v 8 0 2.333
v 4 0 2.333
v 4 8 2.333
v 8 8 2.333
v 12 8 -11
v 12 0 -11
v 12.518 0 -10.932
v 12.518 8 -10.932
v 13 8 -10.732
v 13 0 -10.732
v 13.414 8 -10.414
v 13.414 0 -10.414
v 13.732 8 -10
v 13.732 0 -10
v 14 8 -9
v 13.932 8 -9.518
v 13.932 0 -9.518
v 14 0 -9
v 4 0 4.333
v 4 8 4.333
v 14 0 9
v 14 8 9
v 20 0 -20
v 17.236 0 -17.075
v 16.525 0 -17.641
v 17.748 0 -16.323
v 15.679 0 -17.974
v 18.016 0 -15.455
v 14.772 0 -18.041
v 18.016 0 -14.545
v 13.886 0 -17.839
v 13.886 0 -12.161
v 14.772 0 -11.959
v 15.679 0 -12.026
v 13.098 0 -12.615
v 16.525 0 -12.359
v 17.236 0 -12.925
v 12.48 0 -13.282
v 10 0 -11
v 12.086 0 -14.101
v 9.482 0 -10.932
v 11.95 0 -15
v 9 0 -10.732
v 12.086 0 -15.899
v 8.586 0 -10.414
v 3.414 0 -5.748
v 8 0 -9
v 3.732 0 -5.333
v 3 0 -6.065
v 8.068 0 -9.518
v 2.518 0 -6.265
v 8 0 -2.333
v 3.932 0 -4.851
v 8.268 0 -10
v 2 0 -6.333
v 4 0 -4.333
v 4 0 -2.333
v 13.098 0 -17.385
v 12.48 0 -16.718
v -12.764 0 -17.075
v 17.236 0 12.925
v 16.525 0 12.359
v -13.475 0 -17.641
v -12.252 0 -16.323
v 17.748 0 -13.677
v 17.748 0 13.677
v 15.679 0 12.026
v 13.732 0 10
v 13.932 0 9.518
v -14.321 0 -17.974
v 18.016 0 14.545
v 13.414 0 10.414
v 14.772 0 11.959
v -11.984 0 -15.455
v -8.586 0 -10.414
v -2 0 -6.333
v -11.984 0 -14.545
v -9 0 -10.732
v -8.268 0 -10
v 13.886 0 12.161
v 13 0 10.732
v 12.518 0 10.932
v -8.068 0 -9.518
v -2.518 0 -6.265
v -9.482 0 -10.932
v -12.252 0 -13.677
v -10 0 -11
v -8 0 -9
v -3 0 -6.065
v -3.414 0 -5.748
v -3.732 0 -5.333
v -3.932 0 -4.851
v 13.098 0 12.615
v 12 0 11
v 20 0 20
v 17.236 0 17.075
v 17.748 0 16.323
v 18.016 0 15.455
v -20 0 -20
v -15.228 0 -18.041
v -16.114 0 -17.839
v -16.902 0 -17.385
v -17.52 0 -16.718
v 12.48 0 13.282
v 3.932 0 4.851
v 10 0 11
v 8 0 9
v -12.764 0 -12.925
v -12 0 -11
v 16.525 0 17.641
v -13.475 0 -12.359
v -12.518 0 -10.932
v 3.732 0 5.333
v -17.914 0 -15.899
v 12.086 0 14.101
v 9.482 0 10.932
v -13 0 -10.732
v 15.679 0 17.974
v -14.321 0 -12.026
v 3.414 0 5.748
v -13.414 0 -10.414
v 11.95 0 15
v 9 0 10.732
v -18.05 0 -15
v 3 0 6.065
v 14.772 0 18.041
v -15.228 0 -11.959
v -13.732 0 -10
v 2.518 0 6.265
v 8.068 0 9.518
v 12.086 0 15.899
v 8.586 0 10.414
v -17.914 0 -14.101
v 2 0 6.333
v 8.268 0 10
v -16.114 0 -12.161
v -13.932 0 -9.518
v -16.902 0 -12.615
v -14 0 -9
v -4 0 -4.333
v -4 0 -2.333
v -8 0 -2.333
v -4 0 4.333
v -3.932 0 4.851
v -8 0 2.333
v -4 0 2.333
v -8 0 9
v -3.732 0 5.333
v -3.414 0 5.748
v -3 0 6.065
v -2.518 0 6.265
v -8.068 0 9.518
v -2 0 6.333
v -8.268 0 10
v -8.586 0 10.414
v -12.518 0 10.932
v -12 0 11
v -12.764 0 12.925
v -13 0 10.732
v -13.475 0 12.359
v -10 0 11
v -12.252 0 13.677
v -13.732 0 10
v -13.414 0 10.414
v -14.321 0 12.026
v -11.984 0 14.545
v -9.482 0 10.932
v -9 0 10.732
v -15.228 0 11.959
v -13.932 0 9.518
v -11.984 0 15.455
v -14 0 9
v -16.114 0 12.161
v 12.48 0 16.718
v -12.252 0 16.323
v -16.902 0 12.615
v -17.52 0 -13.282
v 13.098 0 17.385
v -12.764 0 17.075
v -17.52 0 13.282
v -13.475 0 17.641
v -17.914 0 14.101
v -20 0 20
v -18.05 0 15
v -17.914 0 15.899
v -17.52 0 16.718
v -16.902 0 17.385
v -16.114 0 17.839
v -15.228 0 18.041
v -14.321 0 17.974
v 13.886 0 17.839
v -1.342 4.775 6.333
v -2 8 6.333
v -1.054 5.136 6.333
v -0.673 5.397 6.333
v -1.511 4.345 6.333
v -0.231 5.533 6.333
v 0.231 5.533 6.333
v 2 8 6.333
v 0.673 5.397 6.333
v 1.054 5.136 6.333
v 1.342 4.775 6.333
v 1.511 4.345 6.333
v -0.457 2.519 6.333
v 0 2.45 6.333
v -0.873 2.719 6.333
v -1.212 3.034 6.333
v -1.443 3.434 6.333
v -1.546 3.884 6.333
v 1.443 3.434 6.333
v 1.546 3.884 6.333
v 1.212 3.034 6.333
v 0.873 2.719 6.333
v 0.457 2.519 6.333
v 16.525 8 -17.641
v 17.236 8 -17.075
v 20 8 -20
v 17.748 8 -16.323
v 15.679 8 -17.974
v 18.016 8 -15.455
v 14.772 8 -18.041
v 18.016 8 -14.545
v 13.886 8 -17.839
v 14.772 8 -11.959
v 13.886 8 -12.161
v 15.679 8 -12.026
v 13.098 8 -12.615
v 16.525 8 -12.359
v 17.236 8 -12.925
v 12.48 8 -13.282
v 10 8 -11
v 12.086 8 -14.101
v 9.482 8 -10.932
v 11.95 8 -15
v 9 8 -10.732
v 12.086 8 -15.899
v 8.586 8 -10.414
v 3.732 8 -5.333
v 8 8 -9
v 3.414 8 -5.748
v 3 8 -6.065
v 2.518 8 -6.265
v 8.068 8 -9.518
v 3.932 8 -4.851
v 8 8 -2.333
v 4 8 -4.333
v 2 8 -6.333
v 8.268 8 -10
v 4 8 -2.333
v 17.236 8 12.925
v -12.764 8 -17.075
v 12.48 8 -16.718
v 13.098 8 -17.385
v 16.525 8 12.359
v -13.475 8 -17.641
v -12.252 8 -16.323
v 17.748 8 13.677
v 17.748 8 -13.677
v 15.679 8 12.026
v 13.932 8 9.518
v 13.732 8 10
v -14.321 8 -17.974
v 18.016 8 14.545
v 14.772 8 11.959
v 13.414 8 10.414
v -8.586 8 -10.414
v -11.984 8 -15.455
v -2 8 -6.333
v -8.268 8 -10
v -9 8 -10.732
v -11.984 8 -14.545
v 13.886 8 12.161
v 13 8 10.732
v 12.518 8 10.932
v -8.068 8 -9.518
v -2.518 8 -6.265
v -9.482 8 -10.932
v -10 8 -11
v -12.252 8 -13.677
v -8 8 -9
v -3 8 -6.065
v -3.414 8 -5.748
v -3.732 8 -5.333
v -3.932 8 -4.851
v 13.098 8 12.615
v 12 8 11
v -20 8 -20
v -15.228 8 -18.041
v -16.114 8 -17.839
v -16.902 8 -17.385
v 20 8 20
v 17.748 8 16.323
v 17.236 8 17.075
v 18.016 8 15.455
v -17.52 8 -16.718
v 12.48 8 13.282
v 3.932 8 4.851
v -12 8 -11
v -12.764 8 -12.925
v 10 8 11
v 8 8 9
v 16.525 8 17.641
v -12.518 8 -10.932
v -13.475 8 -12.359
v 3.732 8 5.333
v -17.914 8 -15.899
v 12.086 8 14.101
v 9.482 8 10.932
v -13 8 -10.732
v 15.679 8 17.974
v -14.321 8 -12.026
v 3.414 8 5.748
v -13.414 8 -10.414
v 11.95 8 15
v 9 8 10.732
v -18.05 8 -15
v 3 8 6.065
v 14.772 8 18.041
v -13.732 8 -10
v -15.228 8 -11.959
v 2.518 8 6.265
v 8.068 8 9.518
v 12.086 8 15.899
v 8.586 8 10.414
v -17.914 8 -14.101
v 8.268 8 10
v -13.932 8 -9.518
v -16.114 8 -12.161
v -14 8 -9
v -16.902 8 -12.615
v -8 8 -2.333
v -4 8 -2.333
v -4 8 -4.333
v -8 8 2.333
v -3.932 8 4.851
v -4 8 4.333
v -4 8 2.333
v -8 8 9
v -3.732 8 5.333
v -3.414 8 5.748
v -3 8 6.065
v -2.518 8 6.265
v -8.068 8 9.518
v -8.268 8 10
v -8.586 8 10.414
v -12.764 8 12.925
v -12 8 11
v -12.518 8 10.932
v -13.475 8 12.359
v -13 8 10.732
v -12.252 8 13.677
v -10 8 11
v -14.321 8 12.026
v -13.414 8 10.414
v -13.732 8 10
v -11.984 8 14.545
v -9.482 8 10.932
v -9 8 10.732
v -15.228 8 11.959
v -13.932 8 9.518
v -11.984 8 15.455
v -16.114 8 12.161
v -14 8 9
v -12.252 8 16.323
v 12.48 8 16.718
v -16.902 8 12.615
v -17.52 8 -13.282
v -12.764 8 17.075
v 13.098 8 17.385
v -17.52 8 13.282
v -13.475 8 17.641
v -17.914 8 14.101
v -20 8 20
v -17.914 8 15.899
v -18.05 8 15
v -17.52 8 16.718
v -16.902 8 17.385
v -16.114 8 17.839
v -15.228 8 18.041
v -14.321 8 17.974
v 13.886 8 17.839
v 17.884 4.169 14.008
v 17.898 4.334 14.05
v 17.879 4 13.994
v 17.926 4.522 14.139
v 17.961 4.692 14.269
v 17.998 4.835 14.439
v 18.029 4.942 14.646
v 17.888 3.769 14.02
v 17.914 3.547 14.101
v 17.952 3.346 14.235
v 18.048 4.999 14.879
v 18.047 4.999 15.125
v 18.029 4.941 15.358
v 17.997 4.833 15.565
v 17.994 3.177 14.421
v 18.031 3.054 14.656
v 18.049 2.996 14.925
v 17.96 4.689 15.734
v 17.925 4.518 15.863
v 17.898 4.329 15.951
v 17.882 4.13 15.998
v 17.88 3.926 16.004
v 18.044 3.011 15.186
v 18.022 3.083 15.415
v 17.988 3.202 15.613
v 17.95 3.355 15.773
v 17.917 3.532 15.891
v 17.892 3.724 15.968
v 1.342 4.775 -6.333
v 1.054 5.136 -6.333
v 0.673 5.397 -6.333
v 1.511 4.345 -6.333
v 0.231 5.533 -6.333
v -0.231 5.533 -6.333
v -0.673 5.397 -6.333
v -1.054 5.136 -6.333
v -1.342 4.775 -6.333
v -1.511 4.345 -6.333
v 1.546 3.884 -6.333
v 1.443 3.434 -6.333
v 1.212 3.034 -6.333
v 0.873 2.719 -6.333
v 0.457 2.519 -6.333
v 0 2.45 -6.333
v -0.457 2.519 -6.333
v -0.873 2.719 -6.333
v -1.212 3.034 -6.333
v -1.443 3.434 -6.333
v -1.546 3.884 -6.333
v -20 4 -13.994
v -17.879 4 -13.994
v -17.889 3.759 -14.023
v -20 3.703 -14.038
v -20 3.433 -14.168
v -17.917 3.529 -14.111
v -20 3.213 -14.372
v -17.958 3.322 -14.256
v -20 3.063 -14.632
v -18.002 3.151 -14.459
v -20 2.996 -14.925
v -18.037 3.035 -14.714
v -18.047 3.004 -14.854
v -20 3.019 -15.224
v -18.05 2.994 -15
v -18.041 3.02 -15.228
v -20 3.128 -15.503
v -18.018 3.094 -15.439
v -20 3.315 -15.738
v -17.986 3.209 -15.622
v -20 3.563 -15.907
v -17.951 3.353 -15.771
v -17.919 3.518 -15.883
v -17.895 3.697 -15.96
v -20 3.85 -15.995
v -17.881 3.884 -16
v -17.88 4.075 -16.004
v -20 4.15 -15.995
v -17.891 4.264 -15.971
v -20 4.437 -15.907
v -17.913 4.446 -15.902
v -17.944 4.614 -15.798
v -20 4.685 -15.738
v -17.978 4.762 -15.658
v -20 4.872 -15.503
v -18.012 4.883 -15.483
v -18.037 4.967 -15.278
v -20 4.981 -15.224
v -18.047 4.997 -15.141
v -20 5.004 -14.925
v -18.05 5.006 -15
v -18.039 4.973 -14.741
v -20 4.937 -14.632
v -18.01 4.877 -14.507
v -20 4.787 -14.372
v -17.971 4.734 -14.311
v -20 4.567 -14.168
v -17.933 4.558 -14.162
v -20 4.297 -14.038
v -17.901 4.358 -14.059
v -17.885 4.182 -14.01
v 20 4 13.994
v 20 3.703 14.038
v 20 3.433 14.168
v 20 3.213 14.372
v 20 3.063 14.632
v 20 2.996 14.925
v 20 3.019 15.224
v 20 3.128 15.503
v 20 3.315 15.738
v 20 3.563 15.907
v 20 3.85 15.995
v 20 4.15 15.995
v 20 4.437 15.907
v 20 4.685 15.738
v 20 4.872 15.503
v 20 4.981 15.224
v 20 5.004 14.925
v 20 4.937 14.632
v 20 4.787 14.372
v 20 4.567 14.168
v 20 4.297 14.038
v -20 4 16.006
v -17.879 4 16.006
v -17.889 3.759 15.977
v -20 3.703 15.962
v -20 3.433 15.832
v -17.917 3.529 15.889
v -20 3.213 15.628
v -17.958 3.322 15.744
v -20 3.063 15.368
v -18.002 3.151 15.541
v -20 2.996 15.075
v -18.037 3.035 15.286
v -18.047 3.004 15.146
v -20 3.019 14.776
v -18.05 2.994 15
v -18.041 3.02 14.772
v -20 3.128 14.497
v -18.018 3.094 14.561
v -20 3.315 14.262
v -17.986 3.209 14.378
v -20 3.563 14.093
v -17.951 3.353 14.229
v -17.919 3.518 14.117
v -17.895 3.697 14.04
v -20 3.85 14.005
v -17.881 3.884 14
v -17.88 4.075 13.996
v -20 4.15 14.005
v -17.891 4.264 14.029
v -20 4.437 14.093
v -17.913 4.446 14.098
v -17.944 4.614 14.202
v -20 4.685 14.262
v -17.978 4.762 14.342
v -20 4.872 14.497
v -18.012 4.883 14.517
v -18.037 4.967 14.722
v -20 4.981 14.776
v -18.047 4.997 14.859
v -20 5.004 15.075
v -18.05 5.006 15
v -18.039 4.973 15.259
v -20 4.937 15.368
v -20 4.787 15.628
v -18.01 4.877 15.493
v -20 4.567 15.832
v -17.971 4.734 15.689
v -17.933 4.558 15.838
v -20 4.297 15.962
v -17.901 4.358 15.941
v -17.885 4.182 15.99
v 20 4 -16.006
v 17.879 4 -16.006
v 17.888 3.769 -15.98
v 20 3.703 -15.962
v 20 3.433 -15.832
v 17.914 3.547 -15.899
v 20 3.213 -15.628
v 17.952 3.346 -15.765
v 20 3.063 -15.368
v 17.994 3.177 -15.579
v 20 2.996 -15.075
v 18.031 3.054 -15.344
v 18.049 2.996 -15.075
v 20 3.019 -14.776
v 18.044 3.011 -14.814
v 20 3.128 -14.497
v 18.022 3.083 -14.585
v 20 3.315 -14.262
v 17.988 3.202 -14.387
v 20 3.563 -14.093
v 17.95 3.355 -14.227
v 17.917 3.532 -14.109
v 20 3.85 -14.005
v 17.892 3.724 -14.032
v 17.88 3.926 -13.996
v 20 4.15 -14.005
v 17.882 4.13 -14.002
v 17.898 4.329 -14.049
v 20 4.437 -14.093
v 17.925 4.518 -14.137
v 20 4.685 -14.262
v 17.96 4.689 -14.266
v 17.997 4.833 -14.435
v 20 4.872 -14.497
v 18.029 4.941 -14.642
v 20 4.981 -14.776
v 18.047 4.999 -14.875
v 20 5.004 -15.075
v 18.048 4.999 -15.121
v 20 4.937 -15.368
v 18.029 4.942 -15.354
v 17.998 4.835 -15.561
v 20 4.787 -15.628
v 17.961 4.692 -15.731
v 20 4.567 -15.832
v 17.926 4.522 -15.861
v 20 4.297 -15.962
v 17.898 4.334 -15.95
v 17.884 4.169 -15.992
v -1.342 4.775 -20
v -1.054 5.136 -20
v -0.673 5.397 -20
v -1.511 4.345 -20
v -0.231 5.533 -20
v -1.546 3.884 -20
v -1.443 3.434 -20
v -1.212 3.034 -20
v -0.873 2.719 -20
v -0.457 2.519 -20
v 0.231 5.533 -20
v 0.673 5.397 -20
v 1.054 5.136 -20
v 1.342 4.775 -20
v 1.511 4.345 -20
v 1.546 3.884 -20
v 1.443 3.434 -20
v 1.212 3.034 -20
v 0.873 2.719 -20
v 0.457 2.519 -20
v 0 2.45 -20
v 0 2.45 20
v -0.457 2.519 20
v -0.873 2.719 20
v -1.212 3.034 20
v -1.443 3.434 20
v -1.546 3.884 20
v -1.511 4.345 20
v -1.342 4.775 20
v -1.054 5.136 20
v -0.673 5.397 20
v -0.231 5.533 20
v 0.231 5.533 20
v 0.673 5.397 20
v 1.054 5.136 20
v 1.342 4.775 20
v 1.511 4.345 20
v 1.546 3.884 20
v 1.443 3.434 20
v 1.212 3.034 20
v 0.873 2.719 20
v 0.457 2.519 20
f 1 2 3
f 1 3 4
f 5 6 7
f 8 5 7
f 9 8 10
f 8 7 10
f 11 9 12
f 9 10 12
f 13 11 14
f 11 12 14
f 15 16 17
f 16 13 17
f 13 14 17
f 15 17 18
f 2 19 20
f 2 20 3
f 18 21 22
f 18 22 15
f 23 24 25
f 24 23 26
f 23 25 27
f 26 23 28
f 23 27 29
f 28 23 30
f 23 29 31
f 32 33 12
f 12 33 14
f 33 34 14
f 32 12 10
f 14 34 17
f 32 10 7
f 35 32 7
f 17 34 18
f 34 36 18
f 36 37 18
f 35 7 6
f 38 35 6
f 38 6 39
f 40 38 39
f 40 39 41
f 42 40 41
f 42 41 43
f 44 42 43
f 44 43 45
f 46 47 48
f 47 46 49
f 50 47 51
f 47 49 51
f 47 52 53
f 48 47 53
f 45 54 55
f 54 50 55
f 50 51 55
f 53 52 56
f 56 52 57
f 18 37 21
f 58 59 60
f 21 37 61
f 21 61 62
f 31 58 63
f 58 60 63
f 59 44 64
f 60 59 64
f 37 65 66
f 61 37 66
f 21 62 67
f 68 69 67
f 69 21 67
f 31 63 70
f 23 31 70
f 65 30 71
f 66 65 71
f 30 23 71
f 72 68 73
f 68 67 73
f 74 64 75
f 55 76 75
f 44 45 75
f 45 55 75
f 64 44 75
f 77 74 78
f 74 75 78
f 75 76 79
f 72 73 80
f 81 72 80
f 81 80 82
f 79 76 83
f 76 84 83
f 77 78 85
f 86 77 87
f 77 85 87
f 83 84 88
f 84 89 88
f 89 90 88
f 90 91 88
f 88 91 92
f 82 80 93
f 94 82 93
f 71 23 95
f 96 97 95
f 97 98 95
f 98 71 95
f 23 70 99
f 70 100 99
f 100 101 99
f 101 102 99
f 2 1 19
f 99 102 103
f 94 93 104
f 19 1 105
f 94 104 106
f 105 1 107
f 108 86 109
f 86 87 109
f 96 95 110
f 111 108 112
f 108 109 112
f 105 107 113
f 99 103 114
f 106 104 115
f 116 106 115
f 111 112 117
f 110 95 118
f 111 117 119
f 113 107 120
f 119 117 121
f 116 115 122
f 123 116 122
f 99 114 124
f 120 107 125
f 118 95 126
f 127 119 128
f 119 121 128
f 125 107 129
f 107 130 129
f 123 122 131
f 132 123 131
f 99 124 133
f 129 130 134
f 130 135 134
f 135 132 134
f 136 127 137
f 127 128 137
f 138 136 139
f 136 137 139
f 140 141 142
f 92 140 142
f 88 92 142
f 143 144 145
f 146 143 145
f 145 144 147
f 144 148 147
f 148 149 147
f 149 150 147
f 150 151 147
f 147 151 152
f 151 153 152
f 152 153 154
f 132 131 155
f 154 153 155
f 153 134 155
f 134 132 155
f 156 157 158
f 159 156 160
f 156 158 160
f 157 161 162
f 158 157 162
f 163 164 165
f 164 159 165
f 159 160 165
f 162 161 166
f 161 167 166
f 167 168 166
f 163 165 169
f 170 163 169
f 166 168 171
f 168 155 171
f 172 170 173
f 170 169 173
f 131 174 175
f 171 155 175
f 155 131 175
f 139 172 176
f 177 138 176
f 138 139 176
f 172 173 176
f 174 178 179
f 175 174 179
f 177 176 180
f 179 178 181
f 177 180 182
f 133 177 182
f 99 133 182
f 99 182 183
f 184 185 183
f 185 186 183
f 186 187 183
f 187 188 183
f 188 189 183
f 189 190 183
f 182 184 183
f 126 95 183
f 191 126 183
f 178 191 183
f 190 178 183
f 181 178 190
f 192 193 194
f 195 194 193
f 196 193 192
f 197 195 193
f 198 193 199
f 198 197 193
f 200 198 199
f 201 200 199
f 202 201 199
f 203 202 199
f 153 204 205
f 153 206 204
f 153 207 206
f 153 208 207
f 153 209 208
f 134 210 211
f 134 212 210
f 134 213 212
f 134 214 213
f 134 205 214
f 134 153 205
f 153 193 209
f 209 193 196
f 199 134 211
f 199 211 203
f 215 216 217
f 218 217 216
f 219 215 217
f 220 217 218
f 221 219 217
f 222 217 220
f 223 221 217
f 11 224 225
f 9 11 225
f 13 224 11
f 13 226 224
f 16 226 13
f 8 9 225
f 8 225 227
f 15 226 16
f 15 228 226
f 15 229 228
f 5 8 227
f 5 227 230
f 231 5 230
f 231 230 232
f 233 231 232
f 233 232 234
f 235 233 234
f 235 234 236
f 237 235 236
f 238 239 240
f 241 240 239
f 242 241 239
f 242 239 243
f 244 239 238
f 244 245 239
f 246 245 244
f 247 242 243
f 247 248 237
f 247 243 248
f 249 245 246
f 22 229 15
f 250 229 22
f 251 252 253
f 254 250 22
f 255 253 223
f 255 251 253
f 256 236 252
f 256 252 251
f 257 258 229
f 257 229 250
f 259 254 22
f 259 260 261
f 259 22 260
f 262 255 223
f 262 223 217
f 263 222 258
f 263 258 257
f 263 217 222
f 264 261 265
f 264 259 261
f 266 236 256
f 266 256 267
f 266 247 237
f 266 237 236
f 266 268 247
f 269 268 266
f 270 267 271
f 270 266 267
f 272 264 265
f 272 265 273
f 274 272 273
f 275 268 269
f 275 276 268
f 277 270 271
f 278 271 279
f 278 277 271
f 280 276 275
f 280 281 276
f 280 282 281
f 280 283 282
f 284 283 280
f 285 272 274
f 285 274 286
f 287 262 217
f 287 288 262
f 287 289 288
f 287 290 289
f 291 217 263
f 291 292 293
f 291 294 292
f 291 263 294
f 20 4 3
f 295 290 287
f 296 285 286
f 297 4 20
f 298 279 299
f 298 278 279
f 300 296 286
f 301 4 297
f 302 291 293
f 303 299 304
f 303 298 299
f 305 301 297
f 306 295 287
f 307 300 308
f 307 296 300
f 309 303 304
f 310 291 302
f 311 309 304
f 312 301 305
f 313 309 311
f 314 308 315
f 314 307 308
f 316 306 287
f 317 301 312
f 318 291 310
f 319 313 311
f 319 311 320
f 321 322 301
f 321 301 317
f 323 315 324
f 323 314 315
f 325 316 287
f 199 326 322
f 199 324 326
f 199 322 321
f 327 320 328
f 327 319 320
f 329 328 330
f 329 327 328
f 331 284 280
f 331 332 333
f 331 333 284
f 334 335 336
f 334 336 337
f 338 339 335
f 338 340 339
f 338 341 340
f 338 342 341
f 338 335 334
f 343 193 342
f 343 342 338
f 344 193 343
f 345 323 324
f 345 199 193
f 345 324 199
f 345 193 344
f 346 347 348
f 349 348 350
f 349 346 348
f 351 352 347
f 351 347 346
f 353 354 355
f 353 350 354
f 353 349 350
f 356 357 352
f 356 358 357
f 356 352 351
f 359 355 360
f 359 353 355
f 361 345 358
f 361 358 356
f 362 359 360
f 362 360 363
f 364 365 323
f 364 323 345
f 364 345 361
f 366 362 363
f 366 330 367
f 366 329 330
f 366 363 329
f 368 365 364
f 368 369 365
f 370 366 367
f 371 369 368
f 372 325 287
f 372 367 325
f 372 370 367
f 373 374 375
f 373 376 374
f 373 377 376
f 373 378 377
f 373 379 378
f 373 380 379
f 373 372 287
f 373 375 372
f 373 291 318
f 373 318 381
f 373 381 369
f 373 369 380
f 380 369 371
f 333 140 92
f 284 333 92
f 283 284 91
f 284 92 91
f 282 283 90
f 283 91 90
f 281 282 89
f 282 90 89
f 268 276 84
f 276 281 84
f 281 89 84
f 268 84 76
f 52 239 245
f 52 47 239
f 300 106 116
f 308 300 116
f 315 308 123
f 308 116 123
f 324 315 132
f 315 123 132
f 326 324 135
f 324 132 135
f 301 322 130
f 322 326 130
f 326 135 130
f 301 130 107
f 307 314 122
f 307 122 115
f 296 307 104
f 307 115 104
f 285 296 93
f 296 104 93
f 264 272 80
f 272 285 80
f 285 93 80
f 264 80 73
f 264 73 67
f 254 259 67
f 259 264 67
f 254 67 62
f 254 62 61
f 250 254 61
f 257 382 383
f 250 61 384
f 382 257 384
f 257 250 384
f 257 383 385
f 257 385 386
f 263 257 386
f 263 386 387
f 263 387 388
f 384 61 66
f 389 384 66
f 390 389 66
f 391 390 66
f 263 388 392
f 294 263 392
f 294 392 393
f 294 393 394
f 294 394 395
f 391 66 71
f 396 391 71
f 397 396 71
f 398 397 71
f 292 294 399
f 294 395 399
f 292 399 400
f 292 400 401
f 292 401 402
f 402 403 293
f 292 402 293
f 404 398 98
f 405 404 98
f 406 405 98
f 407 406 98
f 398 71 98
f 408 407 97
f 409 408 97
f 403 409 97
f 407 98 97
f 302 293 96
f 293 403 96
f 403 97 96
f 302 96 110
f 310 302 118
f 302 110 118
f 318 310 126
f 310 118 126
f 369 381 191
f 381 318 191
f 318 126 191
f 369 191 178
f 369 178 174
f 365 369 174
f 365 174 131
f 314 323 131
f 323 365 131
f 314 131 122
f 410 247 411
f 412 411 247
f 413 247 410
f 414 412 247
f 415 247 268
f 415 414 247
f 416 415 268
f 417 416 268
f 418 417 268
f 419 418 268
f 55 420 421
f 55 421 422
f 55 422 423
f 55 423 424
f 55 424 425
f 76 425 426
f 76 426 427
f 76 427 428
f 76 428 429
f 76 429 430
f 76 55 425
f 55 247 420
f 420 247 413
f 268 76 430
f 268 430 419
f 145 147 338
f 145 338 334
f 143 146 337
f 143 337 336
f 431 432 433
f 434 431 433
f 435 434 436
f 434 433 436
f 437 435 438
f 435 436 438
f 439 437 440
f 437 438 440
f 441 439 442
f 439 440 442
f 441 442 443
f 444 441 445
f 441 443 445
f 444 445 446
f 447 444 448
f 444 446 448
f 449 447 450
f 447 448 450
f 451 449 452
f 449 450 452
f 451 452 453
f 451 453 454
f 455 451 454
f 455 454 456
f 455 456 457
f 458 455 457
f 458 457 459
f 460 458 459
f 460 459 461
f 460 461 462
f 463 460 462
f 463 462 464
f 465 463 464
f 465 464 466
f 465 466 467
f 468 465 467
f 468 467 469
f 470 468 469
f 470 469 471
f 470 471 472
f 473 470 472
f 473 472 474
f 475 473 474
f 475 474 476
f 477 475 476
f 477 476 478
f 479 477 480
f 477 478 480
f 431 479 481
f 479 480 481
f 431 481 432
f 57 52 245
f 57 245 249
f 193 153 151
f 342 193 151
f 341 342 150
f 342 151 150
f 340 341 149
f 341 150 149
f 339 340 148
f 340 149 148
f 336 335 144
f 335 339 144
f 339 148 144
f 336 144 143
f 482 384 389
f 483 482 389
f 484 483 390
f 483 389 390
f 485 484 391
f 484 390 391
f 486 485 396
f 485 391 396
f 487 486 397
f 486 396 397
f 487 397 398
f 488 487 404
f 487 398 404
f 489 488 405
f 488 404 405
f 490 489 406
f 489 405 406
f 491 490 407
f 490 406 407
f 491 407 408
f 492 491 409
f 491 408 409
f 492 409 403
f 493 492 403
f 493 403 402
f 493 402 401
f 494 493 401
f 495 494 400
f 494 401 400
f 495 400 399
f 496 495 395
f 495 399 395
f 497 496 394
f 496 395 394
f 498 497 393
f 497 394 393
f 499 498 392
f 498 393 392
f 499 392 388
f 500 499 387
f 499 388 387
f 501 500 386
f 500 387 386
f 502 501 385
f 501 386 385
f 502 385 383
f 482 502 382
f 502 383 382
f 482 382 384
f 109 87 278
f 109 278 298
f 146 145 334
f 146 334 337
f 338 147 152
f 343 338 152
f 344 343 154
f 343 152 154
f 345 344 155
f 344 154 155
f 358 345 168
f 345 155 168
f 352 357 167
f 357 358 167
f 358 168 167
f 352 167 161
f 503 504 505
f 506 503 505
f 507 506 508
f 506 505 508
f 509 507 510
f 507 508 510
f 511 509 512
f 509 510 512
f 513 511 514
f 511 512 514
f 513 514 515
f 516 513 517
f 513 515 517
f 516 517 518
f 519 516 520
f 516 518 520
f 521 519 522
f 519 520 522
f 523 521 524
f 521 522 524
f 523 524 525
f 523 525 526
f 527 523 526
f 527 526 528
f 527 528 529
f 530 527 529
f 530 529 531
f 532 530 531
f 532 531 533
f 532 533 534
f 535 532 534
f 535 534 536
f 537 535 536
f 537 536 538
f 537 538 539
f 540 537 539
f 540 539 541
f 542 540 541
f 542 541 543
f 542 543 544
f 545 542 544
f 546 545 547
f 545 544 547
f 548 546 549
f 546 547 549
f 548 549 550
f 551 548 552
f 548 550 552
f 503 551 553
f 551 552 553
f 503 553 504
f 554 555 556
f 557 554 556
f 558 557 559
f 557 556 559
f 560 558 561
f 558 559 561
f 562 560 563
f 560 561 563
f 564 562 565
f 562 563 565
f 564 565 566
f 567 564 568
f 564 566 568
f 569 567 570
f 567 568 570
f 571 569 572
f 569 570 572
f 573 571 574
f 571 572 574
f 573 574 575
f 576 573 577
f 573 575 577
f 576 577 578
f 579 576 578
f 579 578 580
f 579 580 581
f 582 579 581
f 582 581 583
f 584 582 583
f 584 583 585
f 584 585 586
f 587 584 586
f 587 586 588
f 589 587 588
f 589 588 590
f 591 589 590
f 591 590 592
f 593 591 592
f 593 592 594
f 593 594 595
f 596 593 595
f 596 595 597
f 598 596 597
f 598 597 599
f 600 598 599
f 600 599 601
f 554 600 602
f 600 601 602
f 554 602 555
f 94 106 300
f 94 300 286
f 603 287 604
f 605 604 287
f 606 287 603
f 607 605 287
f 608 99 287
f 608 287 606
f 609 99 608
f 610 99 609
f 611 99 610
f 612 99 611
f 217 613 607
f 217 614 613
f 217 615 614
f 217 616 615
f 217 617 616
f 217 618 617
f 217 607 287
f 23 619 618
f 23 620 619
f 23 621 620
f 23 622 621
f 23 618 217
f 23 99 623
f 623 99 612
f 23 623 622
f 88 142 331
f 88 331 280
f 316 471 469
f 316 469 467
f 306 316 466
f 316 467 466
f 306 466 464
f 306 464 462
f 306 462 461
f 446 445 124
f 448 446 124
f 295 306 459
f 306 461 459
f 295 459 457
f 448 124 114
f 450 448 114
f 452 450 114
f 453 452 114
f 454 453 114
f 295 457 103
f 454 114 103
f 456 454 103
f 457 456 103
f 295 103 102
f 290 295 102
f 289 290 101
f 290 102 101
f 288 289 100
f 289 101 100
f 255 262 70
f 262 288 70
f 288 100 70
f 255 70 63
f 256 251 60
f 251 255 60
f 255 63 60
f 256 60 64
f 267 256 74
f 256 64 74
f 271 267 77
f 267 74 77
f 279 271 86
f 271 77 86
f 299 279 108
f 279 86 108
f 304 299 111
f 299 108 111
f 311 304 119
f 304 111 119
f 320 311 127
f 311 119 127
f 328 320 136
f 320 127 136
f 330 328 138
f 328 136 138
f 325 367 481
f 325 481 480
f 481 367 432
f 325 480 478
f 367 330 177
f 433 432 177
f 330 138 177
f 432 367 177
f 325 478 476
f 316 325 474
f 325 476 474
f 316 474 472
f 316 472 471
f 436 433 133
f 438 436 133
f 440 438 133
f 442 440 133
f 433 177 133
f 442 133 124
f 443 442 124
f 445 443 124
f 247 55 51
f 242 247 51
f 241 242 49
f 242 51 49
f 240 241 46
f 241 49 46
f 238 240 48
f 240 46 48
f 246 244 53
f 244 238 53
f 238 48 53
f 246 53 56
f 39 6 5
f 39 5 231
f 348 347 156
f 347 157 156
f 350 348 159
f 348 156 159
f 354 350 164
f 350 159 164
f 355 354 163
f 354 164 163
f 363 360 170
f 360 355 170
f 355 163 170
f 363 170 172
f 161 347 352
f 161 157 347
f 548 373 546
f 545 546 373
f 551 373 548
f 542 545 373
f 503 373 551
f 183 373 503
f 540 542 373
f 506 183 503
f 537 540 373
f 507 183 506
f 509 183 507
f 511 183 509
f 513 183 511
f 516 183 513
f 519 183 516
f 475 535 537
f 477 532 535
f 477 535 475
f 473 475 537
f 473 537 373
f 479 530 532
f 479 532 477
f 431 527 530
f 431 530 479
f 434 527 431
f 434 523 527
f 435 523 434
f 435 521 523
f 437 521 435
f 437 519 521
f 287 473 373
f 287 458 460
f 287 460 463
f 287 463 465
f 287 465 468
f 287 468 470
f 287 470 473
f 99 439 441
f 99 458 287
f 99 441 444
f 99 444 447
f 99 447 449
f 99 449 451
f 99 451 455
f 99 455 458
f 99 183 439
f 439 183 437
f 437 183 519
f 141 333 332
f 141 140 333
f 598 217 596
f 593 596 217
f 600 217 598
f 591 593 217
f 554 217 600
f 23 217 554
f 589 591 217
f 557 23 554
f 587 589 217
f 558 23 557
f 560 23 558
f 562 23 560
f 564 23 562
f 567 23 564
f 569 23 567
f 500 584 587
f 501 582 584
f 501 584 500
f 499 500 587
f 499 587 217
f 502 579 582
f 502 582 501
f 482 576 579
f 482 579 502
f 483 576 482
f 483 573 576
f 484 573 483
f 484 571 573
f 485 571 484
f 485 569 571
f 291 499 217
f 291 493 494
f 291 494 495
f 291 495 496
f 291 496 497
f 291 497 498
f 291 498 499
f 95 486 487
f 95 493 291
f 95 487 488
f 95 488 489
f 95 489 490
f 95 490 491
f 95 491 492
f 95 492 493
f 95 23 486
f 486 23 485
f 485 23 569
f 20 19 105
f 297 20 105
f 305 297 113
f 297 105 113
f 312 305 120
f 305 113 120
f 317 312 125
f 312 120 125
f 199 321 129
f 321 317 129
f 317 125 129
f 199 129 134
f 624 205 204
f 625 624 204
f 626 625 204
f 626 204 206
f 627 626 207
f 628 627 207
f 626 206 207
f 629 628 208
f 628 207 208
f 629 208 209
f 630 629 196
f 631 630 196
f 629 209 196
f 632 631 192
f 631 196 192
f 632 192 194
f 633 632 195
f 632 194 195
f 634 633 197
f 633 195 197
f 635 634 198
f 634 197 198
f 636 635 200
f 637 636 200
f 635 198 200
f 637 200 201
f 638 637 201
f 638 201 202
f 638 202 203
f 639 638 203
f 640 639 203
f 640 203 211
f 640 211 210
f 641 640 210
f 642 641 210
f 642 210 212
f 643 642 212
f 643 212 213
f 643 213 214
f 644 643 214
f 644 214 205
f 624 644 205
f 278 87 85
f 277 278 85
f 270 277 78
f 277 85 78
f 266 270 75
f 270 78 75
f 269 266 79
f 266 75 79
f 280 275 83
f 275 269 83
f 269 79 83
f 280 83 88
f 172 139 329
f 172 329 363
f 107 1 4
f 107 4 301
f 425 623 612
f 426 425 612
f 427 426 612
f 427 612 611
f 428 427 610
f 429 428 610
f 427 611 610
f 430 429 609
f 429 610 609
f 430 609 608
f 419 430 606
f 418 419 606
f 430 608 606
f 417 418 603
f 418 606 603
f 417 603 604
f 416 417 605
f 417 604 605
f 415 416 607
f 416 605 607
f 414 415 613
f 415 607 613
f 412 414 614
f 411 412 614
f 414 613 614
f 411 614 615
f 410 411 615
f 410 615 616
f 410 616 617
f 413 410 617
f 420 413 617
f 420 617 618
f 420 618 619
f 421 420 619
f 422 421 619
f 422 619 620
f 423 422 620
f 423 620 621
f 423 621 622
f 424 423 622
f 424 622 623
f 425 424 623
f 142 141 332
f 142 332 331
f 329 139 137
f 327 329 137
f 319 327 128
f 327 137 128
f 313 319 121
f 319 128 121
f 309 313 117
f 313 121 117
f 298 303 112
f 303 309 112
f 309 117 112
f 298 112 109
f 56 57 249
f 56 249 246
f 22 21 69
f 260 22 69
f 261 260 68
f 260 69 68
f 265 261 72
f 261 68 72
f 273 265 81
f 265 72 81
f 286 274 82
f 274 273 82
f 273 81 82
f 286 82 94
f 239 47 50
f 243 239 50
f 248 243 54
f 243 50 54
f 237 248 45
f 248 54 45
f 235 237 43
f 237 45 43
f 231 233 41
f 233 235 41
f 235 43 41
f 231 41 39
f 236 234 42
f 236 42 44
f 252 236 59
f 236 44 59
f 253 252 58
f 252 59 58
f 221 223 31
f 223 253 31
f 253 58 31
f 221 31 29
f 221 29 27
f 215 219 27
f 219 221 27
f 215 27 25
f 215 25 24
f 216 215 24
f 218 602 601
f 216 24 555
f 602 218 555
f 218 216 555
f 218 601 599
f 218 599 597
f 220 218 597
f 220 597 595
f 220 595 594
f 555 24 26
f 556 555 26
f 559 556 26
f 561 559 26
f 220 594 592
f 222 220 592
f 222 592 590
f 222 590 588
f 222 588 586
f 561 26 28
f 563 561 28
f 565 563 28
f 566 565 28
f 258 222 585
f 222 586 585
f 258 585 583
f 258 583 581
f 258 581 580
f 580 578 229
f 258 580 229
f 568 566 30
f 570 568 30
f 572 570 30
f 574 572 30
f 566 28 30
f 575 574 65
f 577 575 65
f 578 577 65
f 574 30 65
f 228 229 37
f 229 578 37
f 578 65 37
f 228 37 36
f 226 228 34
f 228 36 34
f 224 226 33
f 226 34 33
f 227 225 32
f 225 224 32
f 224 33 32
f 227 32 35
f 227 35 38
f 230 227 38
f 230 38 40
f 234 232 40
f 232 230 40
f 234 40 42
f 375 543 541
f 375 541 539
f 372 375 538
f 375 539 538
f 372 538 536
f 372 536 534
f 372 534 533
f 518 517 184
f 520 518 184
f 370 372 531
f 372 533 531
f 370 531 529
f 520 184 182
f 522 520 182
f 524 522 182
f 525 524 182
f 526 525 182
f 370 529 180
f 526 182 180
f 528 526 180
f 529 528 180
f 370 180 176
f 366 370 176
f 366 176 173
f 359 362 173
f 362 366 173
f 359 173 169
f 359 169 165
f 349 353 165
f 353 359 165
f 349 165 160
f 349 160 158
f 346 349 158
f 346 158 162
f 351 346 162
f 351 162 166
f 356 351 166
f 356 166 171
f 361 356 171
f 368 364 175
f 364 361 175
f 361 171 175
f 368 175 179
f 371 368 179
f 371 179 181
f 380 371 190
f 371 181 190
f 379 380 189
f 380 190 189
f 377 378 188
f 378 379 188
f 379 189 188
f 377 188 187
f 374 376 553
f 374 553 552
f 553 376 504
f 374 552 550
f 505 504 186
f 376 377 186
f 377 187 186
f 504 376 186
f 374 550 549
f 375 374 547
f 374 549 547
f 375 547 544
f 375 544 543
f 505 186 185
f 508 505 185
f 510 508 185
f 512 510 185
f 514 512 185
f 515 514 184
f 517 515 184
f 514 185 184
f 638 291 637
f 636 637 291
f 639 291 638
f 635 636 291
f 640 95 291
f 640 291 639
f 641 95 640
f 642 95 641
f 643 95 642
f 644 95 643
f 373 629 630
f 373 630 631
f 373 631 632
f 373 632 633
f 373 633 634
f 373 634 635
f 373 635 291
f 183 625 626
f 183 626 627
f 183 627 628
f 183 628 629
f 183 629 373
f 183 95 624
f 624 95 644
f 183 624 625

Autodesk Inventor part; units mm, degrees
ref_plane "YZ Plane" through (0, 0, 0) normal (1, 0, 0) x (0, 1, 0)
ref_plane "XZ Plane" through (0, 0, 0) normal (0, 1, 0) x (-1, 0, 0)
ref_plane "XY Plane" through (0, 0, 0) normal (0, 0, 1) x (1, 0, 0)
sketch "Sketch1" plane through (0, 0, 0) normal (0, 1, 0) x (-1, 0, 0)
  line L0 (20, 20) -> (20, -20)
  line L1 (20, -20) -> (-20, -20)
  line L2 (-20, -20) -> (-20, 20)
  line L3 (-20, 20) -> (20, 20)
  line L4 (-15, 15) -> (-15, -15) construction
  line L5 (-15, -15) -> (15, -15) construction
  line L6 (15, -15) -> (15, 15) construction
  line L7 (15, 15) -> (-15, 15) construction
  circle A0 centre (15, 15) radius 3.05
  circle A1 centre (15, -15) radius 3.05
  circle A2 centre (-15, -15) radius 3.05
  circle A3 centre (-15, 15) radius 3.05
  line L8 (0, 0) -> (-18.5703, 0) construction
  line L9 (-8, 2.3333) -> (-8, 9)
  line L10 (-10, 11) -> (-12, 11)
  line L11 (-14, 9) -> (-14, -9)
  line L12 (-12, -11) -> (-10, -11)
  line L13 (-8, -9) -> (-8, -2.3333)
  line L14 (8, -2.3333) -> (8, -9)
  line L15 (10, -11) -> (12, -11)
  line L16 (14, -9) -> (14, 9)
  line L17 (12, 11) -> (10, 11)
  line L18 (8, 9) -> (8, 2.3333)
  line L19 (0, 0) -> (0, 18.05) construction
  line L20 (0, 0) -> (-18.05, 0) construction
  arc A4 (-12, 11) -> (-14, 9) centre (-12, 9) ccw
  arc A5 (-8, 9) -> (-10, 11) centre (-10, 9) ccw
  arc A6 (-10, -11) -> (-8, -9) centre (-10, -9) ccw
  arc A7 (-14, -9) -> (-12, -11) centre (-12, -9) ccw
  arc A8 (8, -9) -> (10, -11) centre (10, -9) ccw
  arc A9 (12, -11) -> (14, -9) centre (12, -9) ccw
  arc A10 (14, 9) -> (12, 11) centre (12, 9) ccw
  arc A11 (10, 11) -> (8, 9) centre (10, 9) ccw
  line L21 (8, 2.3333) -> (4, 2.3333)
  line L22 (4, 2.3333) -> (4, 4.3333)
  line L23 (2, 6.3333) -> (-2, 6.3333)
  line L24 (-4, 4.3333) -> (-4, 2.3333)
  line L25 (-4, 2.3333) -> (-8, 2.3333)
  line L26 (-8, -2.3333) -> (-4, -2.3333)
  line L27 (-4, -2.3333) -> (-4, -4.3333)
  line L28 (-2, -6.3333) -> (2, -6.3333)
  line L29 (4, -4.3333) -> (4, -2.3333)
  line L30 (4, -2.3333) -> (8, -2.3333)
  arc A12 (4, 4.3333) -> (2, 6.3333) centre (2, 4.3333) ccw
  arc A13 (-2, 6.3333) -> (-4, 4.3333) centre (-2, 4.3333) ccw
  arc A14 (-4, -4.3333) -> (-2, -6.3333) centre (-2, -4.3333) ccw
  arc A15 (2, -6.3333) -> (4, -4.3333) centre (2, -4.3333) ccw
  point P0 (-8, 11)
  point P1 (-14, 11)
  point P2 (-8, -11)
  point P3 (8, -11)
  point P4 (14, -11)
  point P5 (8, 11)
  point P6 (4, 6.3333)
  point P7 (-4, 6.3333)
  point P8 (-4, -6.3333)
  point P9 (4, -6.3333)
  dimension "d0" = 40
  dimension "d1" = 40
  dimension "d2" = 30
  dimension "d3" = 6.1
  dimension "d53" = 20
  dimension "d54" = 15
  dimension "d57" = 8
  dimension "d58" = 16
  dimension "d59" = 22
  dimension "d60" = 6
  dimension "d61" = 2
  dimension "d96" = 4.6667
  dimension "d97" = 2.3333
  dimension "d98" = 4
  dimension "d99" = 8
  dimension "d100" = 8
  dimension "d101" = 4
  dimension "d102" = 2
extrude "Extrusion5" add sketch "Sketch1" along normal blind 8
sketch "Sketch8" plane through (-20, 0, 20) normal (0, 0, 1) x (1, 0, 0)
  circle A0 centre (20, 4) radius 1.5
  line L0 (40, 0) -> (0, 0) projected
  point P0 (20, 0)
  dimension "d103" = 3
  dimension "d104" = 4
sketch "Sketch9" plane through (20, 0, 20) normal (1, 0, 0) x (0, 0, -1)
  line L0 (40, 0) -> (0, 0) projected
  line L1 (40, 0) -> (40, 8) projected
  line L2 (0, 8) -> (40, 8) projected
  line L3 (0, 0) -> (0, 8) projected
  point P0 (20, 0)
  point P1 (5, 4)
  point P2 (35, 4)
  dimension "d107" = 5
  dimension "d108" = 5
  dimension "d109" = 4
  dimension "d110" = 4
hole "Hole1" at (20, 4, 15) at (20, 4, -15) direction (-1, 0, 0) diameter 2.013 depth 5 tip angle 118 thread size "M2.5x0.45" class "6H" standard "ISO Metric profile"
sketch "Sketch10" plane through (-20, 0, -20) normal (-1, 0, 0) x (0, 0, 1)
  circle A0 centre (35, 4) radius 1.0065 projected
  circle A1 centre (5, 4) radius 1.0065 projected
  point P0 (20, 0)
  point P1 (33.9935, 4)
  point P2 (3.9935, 4)
hole "Hole2" at (-20, 4, 15) at (-20, 4, -15) direction (1, 0, 0) diameter 2.013 depth 5 tip angle 118 thread size "M2.5x0.45" class "6H" standard "ISO Metric profile"
hole "Hole3" at (0, 4, 20) direction (0, 0, -1) diameter 3.1 end through all
equation "\"d1\" = d0"
properties part number "HolderThin2"
